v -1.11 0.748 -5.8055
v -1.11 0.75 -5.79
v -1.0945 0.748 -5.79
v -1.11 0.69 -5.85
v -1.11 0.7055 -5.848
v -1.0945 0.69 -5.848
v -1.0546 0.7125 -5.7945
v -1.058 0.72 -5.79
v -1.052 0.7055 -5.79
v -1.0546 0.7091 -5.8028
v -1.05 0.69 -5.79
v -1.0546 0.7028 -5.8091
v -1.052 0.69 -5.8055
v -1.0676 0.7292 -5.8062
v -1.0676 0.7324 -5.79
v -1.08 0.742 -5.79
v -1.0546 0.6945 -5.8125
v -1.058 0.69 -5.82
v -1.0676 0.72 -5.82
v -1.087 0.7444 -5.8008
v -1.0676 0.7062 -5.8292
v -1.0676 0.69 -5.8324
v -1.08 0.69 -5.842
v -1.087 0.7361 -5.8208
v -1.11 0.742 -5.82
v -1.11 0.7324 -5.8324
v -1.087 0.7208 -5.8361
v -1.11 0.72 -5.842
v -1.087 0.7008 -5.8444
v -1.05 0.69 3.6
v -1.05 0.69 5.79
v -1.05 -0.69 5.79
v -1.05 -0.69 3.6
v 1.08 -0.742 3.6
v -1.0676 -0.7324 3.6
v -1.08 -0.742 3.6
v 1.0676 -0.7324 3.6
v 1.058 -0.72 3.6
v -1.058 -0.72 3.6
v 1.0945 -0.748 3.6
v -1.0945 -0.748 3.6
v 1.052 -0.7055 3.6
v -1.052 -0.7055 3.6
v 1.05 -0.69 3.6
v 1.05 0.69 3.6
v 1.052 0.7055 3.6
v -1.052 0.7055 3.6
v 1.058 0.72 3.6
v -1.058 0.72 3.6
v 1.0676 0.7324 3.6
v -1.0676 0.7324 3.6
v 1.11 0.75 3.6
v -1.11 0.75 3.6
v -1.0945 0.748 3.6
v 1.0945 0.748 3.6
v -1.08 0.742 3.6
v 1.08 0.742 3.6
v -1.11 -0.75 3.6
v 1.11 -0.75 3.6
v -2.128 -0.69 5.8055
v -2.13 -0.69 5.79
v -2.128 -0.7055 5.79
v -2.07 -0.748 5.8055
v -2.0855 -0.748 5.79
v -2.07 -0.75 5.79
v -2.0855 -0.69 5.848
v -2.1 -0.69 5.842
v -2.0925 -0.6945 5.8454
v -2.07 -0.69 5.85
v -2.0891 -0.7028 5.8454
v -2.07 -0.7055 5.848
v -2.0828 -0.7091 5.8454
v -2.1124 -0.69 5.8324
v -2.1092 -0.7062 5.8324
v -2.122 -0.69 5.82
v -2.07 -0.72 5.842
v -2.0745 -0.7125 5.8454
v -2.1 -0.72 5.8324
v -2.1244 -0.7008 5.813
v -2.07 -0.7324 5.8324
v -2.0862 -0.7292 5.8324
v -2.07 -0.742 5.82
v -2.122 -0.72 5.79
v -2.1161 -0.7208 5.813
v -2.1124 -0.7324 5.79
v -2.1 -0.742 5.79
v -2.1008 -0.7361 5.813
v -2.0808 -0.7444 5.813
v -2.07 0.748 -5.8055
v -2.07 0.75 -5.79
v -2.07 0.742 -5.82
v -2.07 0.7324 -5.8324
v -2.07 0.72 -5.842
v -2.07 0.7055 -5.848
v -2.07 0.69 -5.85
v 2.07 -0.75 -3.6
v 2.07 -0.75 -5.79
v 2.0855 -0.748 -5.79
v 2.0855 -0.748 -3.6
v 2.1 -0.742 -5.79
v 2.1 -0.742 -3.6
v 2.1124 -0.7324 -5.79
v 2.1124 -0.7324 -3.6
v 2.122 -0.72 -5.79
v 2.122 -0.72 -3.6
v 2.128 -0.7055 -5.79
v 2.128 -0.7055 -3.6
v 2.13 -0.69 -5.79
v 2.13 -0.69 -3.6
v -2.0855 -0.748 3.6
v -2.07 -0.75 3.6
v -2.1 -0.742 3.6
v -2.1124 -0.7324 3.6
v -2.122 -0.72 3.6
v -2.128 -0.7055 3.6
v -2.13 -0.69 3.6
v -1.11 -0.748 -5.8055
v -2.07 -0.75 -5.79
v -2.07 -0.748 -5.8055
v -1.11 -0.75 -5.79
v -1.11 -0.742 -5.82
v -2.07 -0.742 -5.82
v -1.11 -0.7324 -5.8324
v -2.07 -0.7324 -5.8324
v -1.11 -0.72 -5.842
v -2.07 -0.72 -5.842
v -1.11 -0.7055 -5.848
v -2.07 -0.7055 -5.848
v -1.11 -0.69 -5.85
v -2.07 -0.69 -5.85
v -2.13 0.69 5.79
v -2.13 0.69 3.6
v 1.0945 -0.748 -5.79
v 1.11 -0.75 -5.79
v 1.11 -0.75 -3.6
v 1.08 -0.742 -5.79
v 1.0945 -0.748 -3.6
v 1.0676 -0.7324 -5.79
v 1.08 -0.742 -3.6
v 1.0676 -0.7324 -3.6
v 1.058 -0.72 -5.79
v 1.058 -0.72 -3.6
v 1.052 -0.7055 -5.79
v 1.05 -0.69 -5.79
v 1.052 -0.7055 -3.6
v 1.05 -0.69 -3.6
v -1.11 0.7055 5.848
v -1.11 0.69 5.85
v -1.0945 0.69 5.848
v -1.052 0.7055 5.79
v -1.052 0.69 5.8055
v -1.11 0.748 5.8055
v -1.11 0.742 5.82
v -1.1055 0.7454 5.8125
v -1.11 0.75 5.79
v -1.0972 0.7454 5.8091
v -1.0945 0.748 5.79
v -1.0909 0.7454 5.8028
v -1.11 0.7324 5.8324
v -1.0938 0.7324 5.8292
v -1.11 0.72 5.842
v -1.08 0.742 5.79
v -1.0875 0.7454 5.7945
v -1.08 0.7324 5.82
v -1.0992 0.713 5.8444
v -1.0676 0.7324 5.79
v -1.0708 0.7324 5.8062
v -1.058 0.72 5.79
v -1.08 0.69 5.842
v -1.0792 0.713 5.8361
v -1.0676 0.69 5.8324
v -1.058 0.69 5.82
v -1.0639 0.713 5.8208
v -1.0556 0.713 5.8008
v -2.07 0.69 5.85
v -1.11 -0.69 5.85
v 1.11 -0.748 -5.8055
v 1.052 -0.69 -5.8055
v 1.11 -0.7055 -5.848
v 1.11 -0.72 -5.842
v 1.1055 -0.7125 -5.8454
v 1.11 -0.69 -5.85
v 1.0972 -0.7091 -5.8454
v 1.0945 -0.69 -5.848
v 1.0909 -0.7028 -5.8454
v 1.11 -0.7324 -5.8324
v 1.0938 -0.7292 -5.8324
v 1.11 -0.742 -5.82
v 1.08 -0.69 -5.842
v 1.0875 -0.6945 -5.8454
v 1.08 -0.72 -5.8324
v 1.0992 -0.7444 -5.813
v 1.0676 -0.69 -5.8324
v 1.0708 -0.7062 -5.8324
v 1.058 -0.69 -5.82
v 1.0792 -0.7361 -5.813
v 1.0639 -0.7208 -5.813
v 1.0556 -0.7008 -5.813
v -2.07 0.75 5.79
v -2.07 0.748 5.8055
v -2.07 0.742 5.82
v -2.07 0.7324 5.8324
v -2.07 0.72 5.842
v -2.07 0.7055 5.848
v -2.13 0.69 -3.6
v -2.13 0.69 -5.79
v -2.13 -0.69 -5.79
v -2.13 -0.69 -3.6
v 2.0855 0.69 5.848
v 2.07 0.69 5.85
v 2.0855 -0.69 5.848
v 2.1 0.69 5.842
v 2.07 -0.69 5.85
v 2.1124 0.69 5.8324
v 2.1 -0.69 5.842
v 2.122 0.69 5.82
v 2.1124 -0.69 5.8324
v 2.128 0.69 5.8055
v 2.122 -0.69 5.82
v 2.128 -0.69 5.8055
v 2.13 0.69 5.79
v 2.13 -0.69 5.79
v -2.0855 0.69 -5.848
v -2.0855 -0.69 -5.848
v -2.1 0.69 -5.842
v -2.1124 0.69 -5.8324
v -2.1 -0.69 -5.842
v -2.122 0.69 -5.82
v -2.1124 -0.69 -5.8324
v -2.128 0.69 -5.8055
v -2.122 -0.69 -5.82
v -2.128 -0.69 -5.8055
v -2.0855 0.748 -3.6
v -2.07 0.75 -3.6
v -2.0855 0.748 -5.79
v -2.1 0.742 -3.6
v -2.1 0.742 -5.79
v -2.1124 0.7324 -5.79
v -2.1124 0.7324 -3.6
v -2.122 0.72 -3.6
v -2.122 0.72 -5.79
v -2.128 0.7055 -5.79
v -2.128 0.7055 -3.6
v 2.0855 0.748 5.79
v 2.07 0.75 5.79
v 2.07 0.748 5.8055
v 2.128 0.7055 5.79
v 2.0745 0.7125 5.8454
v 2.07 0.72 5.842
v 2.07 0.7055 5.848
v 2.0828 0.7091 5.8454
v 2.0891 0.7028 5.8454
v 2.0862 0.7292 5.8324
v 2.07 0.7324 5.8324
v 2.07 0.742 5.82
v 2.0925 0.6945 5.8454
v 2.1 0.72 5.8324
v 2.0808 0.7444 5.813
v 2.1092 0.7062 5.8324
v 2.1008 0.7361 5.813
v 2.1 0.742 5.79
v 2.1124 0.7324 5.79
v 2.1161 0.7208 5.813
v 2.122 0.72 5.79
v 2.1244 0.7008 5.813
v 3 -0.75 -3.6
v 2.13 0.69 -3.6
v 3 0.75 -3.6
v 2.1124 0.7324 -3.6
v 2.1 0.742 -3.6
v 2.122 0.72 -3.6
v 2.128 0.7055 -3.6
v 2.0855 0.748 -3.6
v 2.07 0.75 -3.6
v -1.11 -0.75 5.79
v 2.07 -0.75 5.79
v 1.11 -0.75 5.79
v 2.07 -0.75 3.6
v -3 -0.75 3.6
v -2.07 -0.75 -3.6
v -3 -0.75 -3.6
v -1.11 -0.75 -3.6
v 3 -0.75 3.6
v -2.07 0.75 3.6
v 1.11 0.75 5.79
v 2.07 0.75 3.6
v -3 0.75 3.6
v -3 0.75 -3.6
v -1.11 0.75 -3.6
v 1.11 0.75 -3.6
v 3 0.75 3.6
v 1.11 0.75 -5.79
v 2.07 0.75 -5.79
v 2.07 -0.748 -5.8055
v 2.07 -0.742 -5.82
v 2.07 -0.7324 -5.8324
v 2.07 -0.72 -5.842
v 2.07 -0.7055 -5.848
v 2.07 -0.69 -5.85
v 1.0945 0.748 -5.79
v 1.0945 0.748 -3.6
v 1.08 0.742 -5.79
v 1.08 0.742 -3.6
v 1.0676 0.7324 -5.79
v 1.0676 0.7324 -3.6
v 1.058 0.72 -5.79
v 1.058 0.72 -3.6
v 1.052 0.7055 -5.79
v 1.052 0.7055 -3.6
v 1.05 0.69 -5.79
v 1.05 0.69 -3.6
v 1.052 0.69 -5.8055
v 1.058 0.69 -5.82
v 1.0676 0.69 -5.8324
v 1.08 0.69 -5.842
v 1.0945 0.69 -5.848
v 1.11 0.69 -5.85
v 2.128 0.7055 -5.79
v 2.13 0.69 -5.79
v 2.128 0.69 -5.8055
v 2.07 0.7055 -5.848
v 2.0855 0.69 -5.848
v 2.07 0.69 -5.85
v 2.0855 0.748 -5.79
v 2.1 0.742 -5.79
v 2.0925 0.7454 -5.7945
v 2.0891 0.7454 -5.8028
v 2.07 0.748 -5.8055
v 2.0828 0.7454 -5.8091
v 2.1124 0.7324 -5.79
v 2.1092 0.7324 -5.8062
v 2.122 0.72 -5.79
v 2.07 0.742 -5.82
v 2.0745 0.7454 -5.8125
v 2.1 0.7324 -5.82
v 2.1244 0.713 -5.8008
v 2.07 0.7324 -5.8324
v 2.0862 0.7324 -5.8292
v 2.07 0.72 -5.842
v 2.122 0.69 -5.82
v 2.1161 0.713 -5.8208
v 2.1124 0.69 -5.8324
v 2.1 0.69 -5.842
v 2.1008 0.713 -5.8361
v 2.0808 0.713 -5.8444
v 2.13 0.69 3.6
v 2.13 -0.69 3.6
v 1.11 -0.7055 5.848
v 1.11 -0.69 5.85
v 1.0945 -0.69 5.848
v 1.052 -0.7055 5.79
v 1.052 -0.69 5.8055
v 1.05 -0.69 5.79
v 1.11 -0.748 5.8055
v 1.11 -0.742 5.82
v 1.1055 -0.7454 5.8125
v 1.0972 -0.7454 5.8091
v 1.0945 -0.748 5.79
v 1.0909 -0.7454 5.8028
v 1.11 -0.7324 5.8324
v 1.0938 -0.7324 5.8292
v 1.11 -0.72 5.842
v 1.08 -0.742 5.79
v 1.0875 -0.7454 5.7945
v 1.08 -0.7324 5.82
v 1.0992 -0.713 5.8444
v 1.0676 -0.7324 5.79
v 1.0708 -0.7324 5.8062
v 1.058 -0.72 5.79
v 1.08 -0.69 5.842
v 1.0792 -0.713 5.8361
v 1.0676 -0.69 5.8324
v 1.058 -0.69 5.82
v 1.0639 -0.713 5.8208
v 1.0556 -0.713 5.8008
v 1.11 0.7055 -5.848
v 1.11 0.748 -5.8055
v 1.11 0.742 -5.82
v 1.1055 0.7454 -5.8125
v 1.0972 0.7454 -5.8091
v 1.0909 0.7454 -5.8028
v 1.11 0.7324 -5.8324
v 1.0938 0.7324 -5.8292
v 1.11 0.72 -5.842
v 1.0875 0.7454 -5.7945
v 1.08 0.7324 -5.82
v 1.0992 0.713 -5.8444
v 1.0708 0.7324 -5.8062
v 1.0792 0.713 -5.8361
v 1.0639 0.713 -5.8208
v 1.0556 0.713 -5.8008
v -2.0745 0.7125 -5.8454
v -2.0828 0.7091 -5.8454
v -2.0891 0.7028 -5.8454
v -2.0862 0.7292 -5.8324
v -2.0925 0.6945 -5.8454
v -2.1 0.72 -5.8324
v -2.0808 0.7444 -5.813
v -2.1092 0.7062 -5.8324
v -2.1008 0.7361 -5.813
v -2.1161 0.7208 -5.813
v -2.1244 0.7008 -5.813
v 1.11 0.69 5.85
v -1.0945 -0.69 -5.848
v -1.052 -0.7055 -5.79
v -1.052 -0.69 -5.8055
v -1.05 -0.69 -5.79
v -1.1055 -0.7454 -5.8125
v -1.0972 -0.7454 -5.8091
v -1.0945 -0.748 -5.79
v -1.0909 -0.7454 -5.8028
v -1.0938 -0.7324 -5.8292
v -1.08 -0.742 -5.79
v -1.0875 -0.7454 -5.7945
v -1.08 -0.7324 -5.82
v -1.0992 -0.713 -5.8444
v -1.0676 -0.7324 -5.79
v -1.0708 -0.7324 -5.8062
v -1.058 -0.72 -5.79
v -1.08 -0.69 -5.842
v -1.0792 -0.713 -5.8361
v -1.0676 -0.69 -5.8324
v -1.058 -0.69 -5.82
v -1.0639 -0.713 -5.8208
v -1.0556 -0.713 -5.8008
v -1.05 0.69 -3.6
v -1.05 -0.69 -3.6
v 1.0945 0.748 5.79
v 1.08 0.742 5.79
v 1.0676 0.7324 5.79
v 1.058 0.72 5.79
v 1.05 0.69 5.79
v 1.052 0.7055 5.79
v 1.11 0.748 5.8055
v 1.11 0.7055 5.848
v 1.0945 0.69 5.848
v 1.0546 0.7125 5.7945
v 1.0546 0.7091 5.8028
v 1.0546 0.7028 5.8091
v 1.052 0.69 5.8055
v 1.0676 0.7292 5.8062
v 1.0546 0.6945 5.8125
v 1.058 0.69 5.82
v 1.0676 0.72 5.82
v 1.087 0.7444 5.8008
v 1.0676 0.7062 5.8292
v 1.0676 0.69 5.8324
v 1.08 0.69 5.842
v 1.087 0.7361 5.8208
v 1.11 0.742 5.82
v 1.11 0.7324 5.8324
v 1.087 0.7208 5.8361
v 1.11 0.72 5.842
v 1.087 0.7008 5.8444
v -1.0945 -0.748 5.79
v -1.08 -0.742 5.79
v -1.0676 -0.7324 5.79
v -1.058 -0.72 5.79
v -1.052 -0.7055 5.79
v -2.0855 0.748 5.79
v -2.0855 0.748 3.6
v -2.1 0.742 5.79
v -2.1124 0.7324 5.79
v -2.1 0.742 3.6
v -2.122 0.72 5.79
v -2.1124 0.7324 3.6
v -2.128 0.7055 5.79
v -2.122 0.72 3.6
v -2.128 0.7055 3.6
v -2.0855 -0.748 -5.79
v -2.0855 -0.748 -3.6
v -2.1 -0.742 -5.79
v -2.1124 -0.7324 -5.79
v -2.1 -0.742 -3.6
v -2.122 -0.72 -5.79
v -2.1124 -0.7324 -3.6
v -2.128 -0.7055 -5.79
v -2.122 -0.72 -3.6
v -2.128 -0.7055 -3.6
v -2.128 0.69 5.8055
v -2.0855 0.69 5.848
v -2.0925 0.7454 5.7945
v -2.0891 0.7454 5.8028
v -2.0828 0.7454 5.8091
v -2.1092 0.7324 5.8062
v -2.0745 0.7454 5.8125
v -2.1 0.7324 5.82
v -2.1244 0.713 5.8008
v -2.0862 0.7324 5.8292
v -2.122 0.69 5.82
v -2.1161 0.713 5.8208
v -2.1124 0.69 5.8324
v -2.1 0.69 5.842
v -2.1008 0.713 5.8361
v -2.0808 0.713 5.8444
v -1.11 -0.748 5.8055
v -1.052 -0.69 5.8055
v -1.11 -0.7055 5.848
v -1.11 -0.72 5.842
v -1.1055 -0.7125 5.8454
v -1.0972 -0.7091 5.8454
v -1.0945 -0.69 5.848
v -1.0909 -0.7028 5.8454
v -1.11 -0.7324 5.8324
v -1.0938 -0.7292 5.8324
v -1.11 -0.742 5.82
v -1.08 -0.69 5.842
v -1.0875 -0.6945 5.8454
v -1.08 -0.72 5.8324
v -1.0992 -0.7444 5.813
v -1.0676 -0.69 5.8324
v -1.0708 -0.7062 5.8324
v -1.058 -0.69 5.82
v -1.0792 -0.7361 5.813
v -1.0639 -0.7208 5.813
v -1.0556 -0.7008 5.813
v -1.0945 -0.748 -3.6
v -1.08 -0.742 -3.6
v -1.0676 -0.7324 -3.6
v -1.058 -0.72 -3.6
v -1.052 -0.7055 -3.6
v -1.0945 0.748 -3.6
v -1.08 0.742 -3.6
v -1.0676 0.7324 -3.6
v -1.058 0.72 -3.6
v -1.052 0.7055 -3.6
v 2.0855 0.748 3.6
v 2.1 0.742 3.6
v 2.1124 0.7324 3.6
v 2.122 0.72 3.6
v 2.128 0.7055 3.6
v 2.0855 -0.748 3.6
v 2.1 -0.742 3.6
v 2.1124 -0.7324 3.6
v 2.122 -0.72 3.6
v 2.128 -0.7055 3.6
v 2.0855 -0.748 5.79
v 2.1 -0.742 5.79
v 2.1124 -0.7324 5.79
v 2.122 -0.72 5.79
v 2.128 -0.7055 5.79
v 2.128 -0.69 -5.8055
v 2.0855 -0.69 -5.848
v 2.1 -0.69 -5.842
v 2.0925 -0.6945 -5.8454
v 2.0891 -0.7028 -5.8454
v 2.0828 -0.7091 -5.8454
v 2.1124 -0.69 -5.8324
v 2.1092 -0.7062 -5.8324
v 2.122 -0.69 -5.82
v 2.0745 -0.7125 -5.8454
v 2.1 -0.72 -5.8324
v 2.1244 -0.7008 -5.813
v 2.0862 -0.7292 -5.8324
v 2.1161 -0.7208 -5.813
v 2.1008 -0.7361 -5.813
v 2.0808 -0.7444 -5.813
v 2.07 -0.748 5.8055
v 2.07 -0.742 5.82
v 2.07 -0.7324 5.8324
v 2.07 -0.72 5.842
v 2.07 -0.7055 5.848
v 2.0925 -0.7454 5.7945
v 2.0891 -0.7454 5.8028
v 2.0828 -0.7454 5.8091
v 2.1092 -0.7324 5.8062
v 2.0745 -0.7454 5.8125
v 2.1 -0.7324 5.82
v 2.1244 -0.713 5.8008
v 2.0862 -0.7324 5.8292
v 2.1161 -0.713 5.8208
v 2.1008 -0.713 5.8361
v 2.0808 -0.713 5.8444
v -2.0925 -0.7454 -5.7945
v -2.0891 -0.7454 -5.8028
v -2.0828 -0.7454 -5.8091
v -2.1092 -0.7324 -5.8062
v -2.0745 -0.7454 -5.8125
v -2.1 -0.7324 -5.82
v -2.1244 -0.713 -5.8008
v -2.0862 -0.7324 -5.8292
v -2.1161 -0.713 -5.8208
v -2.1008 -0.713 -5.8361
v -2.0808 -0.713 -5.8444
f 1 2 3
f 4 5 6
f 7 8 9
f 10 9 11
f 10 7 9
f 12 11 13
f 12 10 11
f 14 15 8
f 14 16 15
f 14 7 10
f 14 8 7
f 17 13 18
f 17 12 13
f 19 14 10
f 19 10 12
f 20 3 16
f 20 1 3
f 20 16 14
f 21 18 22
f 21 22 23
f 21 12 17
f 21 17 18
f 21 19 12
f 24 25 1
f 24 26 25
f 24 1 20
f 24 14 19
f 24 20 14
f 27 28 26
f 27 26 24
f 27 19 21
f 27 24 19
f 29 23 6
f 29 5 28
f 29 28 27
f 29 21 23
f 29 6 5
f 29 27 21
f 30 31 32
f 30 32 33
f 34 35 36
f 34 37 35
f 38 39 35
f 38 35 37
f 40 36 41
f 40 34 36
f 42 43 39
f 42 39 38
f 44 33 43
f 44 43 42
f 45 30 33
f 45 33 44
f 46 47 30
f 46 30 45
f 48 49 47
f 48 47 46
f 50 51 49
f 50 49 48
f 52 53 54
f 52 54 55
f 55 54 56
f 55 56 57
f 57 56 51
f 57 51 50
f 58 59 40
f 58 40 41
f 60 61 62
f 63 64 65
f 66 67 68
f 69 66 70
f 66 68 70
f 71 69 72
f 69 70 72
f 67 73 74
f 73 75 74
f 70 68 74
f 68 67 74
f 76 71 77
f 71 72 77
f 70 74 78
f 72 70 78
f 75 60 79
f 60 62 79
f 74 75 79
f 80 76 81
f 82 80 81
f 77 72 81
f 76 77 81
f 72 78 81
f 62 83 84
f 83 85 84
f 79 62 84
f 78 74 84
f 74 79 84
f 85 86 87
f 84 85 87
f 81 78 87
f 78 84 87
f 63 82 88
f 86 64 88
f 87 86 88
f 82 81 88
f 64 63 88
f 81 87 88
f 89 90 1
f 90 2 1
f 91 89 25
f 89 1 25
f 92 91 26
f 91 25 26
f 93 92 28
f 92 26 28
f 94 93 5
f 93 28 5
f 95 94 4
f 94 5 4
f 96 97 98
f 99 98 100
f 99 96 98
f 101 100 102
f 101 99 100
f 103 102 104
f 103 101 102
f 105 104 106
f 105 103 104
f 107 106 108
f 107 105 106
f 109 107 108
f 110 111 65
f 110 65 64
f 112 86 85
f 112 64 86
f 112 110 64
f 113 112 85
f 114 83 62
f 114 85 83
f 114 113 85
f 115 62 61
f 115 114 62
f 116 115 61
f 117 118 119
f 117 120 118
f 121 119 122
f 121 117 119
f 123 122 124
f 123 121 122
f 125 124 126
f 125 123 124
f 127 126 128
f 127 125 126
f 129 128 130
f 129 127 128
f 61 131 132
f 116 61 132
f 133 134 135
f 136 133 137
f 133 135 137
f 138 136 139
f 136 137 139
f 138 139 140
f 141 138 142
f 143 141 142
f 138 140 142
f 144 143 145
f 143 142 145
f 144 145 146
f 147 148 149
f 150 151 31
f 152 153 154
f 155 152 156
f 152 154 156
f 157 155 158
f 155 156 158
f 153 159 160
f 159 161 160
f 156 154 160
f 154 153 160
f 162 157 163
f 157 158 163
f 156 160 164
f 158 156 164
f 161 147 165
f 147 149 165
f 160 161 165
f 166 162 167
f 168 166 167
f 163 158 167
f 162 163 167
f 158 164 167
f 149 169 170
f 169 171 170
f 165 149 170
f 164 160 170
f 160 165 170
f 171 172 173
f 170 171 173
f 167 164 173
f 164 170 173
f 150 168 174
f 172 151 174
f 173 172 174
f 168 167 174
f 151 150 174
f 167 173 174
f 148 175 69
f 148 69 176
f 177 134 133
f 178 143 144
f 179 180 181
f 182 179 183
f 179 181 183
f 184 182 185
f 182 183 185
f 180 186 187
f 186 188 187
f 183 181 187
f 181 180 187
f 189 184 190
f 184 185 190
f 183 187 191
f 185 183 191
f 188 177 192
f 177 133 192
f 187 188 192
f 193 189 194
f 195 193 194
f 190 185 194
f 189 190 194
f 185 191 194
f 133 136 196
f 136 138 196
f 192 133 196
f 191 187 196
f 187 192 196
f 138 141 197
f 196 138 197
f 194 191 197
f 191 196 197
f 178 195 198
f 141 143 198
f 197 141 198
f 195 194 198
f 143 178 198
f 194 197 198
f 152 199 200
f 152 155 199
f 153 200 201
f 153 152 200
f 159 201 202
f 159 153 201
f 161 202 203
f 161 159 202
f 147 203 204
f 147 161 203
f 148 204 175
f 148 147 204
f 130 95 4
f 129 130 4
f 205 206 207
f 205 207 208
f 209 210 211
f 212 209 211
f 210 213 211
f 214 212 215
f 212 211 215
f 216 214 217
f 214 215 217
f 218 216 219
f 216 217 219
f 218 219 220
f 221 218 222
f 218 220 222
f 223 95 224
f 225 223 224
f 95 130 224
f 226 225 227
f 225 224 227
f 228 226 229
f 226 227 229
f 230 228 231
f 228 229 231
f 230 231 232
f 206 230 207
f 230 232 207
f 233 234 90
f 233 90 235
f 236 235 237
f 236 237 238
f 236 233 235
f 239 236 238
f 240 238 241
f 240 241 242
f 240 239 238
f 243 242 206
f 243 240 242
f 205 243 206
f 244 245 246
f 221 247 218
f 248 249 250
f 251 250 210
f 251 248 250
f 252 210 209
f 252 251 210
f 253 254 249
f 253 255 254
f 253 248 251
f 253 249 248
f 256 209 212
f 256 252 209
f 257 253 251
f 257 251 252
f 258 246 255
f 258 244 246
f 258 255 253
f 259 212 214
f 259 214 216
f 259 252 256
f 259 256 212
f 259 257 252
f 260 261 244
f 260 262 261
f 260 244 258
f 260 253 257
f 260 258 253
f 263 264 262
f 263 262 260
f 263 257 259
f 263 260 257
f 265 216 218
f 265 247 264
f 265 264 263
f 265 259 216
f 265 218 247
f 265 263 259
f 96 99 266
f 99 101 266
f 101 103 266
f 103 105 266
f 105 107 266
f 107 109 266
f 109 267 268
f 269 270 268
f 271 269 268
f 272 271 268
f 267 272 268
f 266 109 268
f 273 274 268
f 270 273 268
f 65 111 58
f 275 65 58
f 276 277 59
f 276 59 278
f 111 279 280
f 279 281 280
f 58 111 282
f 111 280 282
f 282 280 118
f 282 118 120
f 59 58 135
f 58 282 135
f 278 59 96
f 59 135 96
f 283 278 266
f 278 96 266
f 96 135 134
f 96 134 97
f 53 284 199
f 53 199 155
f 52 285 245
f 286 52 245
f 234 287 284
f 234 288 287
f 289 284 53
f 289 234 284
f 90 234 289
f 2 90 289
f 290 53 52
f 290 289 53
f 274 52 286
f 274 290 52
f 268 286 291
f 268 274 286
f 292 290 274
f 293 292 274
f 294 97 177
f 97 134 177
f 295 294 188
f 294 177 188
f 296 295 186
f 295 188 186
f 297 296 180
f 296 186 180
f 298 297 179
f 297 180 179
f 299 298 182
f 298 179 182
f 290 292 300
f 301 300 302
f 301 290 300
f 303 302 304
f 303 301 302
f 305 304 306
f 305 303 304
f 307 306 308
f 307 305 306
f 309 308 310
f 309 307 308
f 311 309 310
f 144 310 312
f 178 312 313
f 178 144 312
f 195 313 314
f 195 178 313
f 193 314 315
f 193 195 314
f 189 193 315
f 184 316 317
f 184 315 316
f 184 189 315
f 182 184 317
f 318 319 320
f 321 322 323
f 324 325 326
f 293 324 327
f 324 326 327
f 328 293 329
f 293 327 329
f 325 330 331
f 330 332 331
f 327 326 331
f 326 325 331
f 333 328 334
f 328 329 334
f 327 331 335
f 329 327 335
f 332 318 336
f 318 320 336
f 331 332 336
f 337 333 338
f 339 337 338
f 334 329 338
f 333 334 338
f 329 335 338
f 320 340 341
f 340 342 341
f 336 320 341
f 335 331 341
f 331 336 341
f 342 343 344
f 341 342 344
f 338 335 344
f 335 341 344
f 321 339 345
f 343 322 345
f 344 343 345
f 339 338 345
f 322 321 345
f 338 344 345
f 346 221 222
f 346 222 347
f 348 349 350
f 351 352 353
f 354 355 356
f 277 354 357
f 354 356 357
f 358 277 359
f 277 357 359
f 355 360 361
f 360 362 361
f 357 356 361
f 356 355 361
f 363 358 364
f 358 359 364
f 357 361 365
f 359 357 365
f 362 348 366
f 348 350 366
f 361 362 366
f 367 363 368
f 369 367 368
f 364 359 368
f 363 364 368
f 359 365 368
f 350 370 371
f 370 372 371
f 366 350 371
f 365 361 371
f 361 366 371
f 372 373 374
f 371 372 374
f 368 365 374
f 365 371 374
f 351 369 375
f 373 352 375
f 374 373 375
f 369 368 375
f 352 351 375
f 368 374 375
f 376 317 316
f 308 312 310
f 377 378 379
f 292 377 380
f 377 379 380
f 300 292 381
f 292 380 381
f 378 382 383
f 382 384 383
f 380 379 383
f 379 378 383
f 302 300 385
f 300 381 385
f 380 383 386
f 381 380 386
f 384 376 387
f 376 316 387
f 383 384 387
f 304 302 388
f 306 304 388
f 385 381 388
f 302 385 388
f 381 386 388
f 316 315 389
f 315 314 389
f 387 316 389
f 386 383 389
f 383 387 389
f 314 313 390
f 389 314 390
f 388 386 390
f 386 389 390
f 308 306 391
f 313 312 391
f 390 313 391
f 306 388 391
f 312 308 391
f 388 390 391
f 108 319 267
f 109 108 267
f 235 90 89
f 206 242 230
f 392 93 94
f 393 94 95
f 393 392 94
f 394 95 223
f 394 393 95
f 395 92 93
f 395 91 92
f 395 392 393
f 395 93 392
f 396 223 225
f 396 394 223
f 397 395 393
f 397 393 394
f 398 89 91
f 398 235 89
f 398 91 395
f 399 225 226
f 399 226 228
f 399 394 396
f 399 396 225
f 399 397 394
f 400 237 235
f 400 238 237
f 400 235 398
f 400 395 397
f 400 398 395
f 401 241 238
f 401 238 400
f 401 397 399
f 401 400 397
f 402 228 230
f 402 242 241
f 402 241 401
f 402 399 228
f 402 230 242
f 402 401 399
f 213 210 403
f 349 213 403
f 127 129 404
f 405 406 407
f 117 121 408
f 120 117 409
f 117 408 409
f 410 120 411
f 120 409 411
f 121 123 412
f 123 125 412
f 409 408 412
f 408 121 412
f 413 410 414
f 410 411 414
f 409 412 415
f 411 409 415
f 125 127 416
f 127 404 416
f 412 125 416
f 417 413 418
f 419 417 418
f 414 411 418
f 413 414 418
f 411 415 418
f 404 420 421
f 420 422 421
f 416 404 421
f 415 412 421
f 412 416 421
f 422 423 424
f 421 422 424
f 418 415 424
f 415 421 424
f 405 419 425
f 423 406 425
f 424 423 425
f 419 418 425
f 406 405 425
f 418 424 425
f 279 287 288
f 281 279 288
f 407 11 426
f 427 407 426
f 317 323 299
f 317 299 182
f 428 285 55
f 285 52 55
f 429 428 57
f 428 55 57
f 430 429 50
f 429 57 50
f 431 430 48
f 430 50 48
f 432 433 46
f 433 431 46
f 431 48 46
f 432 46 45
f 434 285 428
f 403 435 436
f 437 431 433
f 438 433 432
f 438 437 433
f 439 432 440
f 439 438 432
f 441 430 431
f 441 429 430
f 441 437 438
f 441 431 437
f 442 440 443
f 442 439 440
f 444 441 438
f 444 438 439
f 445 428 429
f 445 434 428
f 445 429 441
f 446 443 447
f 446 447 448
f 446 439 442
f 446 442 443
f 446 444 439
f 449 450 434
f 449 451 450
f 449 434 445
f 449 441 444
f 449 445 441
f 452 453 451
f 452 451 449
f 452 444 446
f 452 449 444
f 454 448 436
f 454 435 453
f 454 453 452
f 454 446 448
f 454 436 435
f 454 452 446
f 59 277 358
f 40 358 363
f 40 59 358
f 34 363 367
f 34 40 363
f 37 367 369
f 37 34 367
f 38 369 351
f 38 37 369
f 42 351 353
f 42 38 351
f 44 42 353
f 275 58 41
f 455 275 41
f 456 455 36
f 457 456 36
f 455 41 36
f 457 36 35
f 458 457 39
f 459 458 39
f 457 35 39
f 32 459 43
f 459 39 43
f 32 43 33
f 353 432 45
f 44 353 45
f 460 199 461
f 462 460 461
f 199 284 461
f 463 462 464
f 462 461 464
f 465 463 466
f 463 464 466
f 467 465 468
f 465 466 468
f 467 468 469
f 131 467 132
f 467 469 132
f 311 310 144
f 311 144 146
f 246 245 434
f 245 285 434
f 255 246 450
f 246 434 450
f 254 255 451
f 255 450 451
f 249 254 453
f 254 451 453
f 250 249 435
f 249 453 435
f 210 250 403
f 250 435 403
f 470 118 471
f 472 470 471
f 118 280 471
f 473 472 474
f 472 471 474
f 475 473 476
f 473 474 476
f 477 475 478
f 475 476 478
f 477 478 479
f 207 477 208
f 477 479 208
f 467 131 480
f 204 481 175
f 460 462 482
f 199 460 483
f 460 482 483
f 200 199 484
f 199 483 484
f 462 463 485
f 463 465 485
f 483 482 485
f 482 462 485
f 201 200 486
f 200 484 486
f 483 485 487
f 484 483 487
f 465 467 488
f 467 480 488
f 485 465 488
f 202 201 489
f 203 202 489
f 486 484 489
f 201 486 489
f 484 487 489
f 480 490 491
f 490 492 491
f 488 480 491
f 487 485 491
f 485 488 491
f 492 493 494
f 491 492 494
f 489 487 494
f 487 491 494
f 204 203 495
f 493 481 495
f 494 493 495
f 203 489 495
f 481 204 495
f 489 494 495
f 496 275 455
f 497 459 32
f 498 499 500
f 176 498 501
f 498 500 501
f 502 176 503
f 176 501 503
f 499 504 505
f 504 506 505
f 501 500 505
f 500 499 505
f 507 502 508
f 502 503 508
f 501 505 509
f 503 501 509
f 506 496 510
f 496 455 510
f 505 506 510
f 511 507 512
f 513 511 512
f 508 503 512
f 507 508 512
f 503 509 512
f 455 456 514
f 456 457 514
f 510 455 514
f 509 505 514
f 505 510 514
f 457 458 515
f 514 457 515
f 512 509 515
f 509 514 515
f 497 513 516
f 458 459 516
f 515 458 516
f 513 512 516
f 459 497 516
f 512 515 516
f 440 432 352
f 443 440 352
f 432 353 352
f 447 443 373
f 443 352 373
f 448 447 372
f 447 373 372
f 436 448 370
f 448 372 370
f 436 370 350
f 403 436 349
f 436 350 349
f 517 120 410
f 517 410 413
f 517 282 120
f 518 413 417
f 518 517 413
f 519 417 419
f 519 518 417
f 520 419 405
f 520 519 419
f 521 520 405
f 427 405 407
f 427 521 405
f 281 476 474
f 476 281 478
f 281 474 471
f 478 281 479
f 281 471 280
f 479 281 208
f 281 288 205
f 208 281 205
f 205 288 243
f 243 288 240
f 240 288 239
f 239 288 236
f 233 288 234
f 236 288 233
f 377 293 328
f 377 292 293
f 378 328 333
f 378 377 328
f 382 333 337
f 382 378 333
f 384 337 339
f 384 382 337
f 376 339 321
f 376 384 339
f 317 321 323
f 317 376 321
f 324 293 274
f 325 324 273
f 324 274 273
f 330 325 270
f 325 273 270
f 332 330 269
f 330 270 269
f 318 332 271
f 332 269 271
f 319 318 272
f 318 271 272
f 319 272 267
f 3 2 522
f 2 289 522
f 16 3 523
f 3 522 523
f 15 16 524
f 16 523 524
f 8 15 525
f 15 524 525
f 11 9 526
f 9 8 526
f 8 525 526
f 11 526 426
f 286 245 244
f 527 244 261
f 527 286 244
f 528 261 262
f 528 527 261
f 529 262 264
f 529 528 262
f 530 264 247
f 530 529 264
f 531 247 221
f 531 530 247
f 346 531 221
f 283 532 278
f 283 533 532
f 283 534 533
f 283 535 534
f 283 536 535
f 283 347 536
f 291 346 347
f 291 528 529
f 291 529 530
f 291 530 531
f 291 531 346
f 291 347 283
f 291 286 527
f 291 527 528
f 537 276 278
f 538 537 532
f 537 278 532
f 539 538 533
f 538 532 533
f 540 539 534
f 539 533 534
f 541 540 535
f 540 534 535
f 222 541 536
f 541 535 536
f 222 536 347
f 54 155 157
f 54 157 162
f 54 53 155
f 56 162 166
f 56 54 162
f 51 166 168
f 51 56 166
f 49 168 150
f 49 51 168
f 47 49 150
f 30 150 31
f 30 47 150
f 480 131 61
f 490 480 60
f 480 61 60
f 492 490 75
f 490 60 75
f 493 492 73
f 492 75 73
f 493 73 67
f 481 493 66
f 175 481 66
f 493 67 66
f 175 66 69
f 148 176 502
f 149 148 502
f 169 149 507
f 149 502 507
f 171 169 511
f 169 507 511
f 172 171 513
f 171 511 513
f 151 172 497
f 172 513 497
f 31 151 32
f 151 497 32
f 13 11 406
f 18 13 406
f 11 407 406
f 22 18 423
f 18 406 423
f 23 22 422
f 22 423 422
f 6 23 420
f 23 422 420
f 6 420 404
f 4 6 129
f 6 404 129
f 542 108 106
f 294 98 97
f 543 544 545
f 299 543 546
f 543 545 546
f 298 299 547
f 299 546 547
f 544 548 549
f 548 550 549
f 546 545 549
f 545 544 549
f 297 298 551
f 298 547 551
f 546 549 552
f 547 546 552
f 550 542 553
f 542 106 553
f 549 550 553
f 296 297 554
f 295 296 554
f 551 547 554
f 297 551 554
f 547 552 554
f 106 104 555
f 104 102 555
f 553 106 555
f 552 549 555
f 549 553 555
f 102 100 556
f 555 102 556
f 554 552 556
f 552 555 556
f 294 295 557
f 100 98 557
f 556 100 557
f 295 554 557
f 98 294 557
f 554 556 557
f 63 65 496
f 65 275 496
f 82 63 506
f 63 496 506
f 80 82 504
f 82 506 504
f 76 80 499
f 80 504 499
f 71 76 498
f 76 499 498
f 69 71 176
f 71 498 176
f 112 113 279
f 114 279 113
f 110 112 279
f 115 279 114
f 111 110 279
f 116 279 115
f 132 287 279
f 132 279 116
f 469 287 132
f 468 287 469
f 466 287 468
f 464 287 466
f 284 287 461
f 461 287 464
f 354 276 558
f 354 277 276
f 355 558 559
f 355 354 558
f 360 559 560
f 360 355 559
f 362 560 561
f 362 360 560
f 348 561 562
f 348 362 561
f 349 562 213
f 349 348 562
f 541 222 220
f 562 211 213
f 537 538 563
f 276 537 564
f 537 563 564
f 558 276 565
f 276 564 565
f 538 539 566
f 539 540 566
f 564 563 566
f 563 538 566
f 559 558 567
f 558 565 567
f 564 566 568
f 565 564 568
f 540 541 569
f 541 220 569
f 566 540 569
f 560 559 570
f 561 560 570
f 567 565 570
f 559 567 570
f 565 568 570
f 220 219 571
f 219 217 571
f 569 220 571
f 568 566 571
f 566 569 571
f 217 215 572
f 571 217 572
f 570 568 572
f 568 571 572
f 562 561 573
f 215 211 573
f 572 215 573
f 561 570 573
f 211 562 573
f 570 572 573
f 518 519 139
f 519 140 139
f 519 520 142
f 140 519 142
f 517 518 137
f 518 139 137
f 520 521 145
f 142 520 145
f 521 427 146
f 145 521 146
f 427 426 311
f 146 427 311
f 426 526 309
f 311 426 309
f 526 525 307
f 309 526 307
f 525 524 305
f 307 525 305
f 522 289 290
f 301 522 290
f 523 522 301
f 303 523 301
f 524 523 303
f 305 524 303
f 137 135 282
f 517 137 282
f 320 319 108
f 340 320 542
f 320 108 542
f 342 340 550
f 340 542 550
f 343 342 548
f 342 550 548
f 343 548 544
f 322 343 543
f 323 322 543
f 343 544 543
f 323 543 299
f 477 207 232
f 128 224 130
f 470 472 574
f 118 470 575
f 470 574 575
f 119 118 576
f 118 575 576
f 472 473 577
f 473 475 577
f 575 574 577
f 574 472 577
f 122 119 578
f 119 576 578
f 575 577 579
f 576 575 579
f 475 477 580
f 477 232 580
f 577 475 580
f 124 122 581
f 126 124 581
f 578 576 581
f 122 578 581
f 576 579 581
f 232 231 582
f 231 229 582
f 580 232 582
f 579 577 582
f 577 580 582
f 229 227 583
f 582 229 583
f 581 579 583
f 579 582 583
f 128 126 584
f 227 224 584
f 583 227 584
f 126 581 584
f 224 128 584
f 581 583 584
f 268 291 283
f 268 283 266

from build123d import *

# Parameters (mm, degrees)
SKETCH1_W               = 20
SKETCH1_H               = 24
BOSS_EXTRUDE1_DEPTH     = 2.5
SKETCH2_W               = 3.6
SKETCH2_H               = 7.5
BOSS_EXTRUDE2_DEPTH     = 5
MIRROR2_COPY_1_SKETCH_W = 3.6
MIRROR2_COPY_1_SKETCH_H = 7.5
MIRROR2_COPY_1_DEPTH    = 5
FILLET1_R               = 0.2
SCALE1_SCALE            = 0.3


with BuildPart() as part:
    # Sketch1 → Boss-Extrude1 (new body, symmetric)
    with BuildSketch(Plane(origin=(0, 0, 0), x_dir=(1, 0, 0), z_dir=(0, 1, 0))):
        Rectangle(SKETCH1_W, SKETCH1_H)
    extrude(amount=BOSS_EXTRUDE1_DEPTH, both=True)

    # Sketch2 → Boss-Extrude2 (add)
    with BuildSketch(Plane(origin=(0, 2.5, 0), x_dir=(1, 0, 0), z_dir=(0, 1, 0))):
        with Locations((-5.3, -15.75)):
            Rectangle(SKETCH2_W, SKETCH2_H)
    boss_extrude2 = extrude(amount=-BOSS_EXTRUDE2_DEPTH)

    # Mirror1: Boss-Extrude2 across plane
    add(boss_extrude2.mirror(Plane(origin=(0, 0, 0), x_dir=(0, 0, 1), z_dir=(1, 0, 0))))

    # Mirror2: Boss-Extrude2 across plane
    add(boss_extrude2.mirror(Plane.XY))

    # Mirror2 copy 1 sketch → Mirror2 copy 1 (add)
    with BuildSketch(Plane(origin=(0, 2.5, 0), x_dir=(-1, 0, 0), z_dir=(0, 1, 0))):
        with Locations((-5.3, -15.75)):
            Rectangle(MIRROR2_COPY_1_SKETCH_W, MIRROR2_COPY_1_SKETCH_H)
    extrude(amount=-MIRROR2_COPY_1_DEPTH)

    # Fillet1
    fillet1_edges = [part.edges().sort_by_distance(p)[0] for p in [
        (-7.1, -2.5, 15.75),
        (-7.1, 0, 19.5),
        (-3.5, -2.5, 15.75),
        (-5.3, -2.5, 19.5),
        (-3.5, 0, 19.5),
        (-7.1, 2.5, 15.75),
        (-5.3, 2.5, 19.5),
        (-3.5, 2.5, 15.75),
        (7.1, 2.5, 15.75),
        (5.3, 2.5, 19.5),
        (7.1, 0, 19.5),
        (3.5, 2.5, 15.75),
        (3.5, 0, 19.5),
        (7.1, -2.5, 15.75),
        (5.3, -2.5, 19.5),
        (3.5, -2.5, 15.75),
        (-7.1, 2.5, -15.75),
        (-5.3, 2.5, -19.5),
        (-7.1, 0, -19.5),
        (-3.5, 2.5, -15.75),
        (-3.5, 0, -19.5),
        (-7.1, -2.5, -15.75),
        (-5.3, -2.5, -19.5),
        (-3.5, -2.5, -15.75),
        (7.1, -2.5, -15.75),
        (7.1, 0, -19.5),
        (3.5, -2.5, -15.75),
        (5.3, -2.5, -19.5),
        (3.5, 0, -19.5),
        (7.1, 2.5, -15.75),
        (5.3, 2.5, -19.5),
        (3.5, 2.5, -15.75),
    ]]
    fillet(fillet1_edges, radius=FILLET1_R)


with BuildPart() as part_1:
    # Scale1: scaled about (0, 0, 0)
    add(part.part.scale(SCALE1_SCALE))


solid = part_1.part
